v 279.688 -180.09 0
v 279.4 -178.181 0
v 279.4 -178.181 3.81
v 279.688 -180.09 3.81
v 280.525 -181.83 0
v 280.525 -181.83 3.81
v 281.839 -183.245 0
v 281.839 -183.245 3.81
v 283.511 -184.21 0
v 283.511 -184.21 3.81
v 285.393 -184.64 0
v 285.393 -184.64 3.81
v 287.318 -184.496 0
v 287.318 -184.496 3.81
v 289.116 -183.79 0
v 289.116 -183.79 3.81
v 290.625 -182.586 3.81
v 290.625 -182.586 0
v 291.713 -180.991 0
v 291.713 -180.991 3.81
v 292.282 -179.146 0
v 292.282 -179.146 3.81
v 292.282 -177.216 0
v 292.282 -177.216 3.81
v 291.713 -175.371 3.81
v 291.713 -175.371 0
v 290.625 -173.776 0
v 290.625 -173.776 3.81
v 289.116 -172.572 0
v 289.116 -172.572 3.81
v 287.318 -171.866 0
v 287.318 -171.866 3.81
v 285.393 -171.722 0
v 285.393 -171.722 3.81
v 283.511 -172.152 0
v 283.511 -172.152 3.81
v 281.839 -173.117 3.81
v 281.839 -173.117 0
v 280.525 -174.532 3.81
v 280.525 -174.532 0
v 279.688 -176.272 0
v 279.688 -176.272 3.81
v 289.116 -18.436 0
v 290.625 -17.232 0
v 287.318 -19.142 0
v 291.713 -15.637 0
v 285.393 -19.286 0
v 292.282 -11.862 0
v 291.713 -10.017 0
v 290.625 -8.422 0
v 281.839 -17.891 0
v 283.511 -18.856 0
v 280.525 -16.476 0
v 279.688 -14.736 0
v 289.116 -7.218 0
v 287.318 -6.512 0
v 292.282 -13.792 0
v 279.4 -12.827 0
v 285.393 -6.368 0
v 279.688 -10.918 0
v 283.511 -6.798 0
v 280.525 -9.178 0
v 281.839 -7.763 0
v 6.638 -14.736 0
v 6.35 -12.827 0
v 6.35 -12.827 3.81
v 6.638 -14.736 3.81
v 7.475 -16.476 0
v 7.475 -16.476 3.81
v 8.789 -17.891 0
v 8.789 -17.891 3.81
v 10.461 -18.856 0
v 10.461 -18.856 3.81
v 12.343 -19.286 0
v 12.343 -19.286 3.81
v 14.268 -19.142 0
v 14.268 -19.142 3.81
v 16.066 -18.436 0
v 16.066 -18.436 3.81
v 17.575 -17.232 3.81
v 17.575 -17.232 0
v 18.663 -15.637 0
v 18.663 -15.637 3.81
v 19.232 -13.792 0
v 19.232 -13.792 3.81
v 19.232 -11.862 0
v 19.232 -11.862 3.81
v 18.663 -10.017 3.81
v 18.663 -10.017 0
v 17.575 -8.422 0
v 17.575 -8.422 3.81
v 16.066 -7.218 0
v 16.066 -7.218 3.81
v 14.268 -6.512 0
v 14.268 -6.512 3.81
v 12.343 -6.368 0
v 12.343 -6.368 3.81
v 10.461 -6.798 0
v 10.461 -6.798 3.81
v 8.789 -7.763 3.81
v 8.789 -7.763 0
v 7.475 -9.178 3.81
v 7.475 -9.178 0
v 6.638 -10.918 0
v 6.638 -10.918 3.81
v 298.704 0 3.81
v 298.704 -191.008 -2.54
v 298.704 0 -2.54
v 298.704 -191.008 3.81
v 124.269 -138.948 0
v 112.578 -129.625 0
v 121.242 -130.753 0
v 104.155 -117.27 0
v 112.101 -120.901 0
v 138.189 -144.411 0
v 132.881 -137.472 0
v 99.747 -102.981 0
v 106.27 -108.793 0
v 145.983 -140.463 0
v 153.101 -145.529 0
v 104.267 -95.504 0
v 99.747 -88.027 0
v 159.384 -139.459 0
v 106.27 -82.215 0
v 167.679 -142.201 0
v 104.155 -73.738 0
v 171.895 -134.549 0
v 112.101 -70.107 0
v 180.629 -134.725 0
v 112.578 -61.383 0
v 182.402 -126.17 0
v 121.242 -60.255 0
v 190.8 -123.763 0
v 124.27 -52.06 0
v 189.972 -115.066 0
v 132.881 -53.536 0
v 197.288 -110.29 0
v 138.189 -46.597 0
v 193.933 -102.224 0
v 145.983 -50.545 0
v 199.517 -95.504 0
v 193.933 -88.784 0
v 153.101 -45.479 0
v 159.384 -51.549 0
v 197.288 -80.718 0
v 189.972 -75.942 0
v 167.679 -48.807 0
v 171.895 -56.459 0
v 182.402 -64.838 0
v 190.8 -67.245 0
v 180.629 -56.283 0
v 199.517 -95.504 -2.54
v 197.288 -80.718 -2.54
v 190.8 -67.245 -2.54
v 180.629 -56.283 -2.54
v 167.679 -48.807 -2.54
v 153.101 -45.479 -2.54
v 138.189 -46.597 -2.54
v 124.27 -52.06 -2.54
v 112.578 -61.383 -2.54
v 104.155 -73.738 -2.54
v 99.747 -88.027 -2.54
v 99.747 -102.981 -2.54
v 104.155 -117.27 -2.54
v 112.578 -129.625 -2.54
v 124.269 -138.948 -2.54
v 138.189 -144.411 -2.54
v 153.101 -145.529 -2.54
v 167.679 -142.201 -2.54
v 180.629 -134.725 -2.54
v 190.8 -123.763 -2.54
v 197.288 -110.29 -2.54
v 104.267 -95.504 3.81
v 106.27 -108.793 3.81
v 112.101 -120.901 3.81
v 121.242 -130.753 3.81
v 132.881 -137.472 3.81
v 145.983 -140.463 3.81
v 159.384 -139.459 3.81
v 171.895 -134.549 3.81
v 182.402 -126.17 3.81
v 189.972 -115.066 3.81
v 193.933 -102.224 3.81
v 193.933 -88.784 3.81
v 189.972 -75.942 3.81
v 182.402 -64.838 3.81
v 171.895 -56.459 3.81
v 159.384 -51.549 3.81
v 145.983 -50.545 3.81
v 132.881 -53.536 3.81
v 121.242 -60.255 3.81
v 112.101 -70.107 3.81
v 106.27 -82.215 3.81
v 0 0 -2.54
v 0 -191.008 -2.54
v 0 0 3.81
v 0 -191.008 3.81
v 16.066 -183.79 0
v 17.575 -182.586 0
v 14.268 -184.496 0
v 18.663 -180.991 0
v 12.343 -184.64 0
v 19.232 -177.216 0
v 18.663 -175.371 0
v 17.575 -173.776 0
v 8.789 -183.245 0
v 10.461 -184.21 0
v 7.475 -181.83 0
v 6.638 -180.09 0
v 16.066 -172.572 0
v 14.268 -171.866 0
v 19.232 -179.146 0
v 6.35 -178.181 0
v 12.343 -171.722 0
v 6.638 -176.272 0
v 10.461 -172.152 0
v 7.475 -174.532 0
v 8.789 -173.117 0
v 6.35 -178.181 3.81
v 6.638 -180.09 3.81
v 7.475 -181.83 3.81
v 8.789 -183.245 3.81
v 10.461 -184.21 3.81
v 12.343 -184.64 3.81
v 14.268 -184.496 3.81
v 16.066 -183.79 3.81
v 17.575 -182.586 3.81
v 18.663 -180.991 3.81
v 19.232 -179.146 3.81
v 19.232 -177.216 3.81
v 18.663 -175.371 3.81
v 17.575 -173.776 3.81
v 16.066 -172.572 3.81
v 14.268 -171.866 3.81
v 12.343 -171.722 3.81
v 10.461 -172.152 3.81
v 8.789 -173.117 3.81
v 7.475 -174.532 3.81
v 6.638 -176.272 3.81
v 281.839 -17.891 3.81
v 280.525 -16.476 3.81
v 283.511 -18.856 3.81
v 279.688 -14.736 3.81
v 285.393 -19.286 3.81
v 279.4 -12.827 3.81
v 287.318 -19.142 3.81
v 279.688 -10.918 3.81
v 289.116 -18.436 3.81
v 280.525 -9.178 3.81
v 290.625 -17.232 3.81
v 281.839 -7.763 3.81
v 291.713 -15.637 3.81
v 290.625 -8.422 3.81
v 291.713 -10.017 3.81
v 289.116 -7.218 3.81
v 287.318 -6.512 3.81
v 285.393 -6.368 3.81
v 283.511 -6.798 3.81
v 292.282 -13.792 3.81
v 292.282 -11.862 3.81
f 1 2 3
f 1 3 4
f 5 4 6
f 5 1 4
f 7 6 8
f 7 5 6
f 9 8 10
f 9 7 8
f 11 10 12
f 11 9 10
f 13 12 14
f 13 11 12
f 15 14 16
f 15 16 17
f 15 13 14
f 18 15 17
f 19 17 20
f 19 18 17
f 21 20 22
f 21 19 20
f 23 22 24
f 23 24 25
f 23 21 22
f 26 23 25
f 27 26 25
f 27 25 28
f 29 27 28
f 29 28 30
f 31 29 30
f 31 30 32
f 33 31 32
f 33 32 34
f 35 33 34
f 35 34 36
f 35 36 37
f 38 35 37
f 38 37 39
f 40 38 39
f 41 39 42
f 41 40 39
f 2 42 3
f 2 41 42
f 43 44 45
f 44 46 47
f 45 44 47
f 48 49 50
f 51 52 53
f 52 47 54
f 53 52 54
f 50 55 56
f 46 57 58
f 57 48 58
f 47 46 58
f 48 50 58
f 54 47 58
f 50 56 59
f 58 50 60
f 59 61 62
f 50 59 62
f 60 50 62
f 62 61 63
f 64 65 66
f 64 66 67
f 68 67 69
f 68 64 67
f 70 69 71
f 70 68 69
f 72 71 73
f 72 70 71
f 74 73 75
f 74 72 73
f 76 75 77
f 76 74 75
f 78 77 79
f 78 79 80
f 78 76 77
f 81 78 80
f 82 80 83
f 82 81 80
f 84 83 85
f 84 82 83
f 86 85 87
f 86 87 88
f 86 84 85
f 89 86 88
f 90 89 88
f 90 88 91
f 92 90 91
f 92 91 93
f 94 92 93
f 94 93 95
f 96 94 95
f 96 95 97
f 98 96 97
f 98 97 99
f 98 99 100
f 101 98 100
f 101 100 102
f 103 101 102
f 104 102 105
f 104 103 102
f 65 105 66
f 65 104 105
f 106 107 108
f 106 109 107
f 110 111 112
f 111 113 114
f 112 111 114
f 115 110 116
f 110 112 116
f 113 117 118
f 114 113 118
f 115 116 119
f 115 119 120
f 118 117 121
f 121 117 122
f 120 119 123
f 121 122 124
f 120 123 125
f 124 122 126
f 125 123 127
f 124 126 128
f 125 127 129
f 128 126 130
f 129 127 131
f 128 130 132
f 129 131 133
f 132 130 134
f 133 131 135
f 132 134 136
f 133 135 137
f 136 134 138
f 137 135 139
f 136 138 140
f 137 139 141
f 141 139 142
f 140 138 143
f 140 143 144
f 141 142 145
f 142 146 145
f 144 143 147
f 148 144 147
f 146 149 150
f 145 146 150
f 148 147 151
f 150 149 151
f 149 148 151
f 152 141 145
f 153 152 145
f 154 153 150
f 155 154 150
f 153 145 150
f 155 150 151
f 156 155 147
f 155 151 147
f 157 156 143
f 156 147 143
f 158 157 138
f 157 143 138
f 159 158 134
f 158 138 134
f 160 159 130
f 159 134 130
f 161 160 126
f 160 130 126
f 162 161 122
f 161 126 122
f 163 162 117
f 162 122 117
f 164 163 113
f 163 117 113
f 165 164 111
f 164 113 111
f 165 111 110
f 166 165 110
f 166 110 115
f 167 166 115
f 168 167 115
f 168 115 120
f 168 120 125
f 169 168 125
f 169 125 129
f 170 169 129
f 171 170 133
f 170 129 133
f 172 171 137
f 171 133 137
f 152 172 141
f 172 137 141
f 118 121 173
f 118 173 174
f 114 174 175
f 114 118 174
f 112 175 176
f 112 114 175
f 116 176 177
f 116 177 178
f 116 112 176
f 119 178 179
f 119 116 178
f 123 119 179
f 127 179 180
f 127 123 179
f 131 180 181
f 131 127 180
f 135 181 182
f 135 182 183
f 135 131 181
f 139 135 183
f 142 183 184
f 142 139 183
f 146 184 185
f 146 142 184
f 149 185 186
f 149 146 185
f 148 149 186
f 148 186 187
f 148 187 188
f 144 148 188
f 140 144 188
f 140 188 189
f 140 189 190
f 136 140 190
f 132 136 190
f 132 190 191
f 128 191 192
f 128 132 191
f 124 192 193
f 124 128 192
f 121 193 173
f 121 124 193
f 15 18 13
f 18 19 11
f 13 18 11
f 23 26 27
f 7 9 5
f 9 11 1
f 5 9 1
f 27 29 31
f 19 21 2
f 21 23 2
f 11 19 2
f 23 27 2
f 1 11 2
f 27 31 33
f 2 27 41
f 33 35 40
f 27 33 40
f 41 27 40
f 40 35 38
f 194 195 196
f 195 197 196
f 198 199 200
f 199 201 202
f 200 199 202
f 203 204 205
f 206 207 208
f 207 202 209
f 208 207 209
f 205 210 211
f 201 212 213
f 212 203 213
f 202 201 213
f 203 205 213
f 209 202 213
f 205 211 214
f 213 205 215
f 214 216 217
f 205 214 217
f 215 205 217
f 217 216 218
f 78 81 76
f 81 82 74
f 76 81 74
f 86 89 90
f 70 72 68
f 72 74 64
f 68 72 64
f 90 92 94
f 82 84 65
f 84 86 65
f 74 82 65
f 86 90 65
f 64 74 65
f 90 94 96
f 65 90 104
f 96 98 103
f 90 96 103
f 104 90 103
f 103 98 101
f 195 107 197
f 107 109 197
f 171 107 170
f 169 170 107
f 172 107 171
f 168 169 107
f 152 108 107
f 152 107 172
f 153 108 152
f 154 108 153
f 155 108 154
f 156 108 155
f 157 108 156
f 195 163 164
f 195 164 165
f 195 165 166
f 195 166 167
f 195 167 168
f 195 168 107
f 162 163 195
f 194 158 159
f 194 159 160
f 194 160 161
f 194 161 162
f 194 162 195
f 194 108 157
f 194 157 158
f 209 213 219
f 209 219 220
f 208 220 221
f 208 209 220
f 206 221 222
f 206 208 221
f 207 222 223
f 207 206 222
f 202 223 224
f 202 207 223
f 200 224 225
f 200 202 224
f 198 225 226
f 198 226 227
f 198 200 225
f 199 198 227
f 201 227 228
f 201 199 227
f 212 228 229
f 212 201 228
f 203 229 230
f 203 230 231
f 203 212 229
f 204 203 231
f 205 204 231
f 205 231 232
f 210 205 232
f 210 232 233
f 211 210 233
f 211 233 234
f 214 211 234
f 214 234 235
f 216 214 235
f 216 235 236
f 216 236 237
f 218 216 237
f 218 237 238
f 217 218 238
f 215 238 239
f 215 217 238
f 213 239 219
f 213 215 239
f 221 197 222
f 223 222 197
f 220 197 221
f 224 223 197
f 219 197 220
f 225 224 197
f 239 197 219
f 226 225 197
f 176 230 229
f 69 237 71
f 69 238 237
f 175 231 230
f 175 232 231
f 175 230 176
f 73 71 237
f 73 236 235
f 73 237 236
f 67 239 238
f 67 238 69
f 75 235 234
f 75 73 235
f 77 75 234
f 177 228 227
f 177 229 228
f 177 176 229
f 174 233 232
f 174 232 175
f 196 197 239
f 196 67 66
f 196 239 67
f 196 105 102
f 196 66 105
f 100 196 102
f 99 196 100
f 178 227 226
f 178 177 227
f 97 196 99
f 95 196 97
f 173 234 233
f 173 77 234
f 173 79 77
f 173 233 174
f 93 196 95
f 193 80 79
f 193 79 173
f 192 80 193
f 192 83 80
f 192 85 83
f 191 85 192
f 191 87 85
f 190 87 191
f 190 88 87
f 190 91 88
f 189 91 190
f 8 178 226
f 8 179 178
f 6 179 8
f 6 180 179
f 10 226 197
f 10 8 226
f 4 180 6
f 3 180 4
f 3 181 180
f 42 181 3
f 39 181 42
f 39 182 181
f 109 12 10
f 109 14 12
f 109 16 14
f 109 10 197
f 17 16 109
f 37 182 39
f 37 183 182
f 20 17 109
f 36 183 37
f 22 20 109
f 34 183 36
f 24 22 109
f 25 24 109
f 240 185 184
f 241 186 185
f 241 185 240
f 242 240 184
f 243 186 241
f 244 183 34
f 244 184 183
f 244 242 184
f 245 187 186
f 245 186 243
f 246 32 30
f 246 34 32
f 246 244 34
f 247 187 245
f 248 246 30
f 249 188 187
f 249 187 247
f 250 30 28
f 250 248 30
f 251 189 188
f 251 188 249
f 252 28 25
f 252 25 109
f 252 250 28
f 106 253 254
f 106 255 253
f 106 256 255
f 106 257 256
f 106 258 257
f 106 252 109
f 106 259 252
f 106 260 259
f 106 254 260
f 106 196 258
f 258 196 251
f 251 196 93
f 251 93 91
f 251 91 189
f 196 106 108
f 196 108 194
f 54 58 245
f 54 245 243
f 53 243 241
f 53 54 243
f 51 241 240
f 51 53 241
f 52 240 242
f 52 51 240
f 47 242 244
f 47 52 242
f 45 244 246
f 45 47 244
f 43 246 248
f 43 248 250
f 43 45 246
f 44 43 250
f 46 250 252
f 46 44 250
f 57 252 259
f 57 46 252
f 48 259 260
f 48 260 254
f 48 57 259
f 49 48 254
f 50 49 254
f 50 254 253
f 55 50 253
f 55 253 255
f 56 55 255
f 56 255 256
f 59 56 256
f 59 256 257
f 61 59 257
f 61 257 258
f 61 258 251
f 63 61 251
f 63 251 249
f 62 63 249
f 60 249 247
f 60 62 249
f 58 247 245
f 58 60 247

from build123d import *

# Parameters (mm, degrees)
SKETCH1_W           = 298.704
SKETCH1_H           = 191.008
SKETCH1_R           = 6.477
SKETCH1_R_2         = 45.085
BOSS_EXTRUDE1_DEPTH = 3.81
SKETCH3_W           = 298.704
SKETCH3_H           = 191.008
SKETCH3_R           = 47.625
BOSS_EXTRUDE2_DEPTH = 2.54
CUT_EXTRUDE1_START  = -3.81
SKETCH4_R           = 50.165
CUT_EXTRUDE1_DEPTH  = 2.54


with BuildPart() as part:
    # Sketch1 → Boss-Extrude1 (new body)
    with BuildSketch(Plane.XY):
        with Locations((149.352, -95.504)):
            Rectangle(SKETCH1_W, SKETCH1_H)
        with Locations(Location((12.827, -12.827, 0), (0, 0, 180))):
            Circle(SKETCH1_R, mode=Mode.SUBTRACT)
        with Locations(Location((285.877, -12.827, 0), (0, 0, 180))):
            Circle(SKETCH1_R, mode=Mode.SUBTRACT)
        with Locations(Location((285.877, -178.181, 0), (0, 0, 180))):
            Circle(SKETCH1_R, mode=Mode.SUBTRACT)
        with Locations(Location((12.827, -178.181, 0), (0, 0, 180))):
            Circle(SKETCH1_R, mode=Mode.SUBTRACT)
        with Locations(Location((149.352, -95.504, 0), (0, 0, 180))):
            Circle(SKETCH1_R_2, mode=Mode.SUBTRACT)
    extrude(amount=BOSS_EXTRUDE1_DEPTH)

    # Sketch3 → Boss-Extrude2 (add)
    with BuildSketch(Plane(origin=(0, 0, 0), x_dir=(-1, 0, 0), z_dir=(0, 0, -1))):
        with Locations((-149.352, -95.504)):
            Rectangle(SKETCH3_W, SKETCH3_H)
        with Locations((-149.352, -95.504)):
            Circle(SKETCH3_R, mode=Mode.SUBTRACT)
    extrude(amount=BOSS_EXTRUDE2_DEPTH)

    # Sketch4 → Cut-Extrude1 (cut)
    with BuildSketch(Plane.XY.offset(3.81).offset(CUT_EXTRUDE1_START)):
        with Locations((149.352, -95.504)):
            Circle(SKETCH4_R)
    extrude(amount=-CUT_EXTRUDE1_DEPTH, mode=Mode.SUBTRACT)


solid = part.part
